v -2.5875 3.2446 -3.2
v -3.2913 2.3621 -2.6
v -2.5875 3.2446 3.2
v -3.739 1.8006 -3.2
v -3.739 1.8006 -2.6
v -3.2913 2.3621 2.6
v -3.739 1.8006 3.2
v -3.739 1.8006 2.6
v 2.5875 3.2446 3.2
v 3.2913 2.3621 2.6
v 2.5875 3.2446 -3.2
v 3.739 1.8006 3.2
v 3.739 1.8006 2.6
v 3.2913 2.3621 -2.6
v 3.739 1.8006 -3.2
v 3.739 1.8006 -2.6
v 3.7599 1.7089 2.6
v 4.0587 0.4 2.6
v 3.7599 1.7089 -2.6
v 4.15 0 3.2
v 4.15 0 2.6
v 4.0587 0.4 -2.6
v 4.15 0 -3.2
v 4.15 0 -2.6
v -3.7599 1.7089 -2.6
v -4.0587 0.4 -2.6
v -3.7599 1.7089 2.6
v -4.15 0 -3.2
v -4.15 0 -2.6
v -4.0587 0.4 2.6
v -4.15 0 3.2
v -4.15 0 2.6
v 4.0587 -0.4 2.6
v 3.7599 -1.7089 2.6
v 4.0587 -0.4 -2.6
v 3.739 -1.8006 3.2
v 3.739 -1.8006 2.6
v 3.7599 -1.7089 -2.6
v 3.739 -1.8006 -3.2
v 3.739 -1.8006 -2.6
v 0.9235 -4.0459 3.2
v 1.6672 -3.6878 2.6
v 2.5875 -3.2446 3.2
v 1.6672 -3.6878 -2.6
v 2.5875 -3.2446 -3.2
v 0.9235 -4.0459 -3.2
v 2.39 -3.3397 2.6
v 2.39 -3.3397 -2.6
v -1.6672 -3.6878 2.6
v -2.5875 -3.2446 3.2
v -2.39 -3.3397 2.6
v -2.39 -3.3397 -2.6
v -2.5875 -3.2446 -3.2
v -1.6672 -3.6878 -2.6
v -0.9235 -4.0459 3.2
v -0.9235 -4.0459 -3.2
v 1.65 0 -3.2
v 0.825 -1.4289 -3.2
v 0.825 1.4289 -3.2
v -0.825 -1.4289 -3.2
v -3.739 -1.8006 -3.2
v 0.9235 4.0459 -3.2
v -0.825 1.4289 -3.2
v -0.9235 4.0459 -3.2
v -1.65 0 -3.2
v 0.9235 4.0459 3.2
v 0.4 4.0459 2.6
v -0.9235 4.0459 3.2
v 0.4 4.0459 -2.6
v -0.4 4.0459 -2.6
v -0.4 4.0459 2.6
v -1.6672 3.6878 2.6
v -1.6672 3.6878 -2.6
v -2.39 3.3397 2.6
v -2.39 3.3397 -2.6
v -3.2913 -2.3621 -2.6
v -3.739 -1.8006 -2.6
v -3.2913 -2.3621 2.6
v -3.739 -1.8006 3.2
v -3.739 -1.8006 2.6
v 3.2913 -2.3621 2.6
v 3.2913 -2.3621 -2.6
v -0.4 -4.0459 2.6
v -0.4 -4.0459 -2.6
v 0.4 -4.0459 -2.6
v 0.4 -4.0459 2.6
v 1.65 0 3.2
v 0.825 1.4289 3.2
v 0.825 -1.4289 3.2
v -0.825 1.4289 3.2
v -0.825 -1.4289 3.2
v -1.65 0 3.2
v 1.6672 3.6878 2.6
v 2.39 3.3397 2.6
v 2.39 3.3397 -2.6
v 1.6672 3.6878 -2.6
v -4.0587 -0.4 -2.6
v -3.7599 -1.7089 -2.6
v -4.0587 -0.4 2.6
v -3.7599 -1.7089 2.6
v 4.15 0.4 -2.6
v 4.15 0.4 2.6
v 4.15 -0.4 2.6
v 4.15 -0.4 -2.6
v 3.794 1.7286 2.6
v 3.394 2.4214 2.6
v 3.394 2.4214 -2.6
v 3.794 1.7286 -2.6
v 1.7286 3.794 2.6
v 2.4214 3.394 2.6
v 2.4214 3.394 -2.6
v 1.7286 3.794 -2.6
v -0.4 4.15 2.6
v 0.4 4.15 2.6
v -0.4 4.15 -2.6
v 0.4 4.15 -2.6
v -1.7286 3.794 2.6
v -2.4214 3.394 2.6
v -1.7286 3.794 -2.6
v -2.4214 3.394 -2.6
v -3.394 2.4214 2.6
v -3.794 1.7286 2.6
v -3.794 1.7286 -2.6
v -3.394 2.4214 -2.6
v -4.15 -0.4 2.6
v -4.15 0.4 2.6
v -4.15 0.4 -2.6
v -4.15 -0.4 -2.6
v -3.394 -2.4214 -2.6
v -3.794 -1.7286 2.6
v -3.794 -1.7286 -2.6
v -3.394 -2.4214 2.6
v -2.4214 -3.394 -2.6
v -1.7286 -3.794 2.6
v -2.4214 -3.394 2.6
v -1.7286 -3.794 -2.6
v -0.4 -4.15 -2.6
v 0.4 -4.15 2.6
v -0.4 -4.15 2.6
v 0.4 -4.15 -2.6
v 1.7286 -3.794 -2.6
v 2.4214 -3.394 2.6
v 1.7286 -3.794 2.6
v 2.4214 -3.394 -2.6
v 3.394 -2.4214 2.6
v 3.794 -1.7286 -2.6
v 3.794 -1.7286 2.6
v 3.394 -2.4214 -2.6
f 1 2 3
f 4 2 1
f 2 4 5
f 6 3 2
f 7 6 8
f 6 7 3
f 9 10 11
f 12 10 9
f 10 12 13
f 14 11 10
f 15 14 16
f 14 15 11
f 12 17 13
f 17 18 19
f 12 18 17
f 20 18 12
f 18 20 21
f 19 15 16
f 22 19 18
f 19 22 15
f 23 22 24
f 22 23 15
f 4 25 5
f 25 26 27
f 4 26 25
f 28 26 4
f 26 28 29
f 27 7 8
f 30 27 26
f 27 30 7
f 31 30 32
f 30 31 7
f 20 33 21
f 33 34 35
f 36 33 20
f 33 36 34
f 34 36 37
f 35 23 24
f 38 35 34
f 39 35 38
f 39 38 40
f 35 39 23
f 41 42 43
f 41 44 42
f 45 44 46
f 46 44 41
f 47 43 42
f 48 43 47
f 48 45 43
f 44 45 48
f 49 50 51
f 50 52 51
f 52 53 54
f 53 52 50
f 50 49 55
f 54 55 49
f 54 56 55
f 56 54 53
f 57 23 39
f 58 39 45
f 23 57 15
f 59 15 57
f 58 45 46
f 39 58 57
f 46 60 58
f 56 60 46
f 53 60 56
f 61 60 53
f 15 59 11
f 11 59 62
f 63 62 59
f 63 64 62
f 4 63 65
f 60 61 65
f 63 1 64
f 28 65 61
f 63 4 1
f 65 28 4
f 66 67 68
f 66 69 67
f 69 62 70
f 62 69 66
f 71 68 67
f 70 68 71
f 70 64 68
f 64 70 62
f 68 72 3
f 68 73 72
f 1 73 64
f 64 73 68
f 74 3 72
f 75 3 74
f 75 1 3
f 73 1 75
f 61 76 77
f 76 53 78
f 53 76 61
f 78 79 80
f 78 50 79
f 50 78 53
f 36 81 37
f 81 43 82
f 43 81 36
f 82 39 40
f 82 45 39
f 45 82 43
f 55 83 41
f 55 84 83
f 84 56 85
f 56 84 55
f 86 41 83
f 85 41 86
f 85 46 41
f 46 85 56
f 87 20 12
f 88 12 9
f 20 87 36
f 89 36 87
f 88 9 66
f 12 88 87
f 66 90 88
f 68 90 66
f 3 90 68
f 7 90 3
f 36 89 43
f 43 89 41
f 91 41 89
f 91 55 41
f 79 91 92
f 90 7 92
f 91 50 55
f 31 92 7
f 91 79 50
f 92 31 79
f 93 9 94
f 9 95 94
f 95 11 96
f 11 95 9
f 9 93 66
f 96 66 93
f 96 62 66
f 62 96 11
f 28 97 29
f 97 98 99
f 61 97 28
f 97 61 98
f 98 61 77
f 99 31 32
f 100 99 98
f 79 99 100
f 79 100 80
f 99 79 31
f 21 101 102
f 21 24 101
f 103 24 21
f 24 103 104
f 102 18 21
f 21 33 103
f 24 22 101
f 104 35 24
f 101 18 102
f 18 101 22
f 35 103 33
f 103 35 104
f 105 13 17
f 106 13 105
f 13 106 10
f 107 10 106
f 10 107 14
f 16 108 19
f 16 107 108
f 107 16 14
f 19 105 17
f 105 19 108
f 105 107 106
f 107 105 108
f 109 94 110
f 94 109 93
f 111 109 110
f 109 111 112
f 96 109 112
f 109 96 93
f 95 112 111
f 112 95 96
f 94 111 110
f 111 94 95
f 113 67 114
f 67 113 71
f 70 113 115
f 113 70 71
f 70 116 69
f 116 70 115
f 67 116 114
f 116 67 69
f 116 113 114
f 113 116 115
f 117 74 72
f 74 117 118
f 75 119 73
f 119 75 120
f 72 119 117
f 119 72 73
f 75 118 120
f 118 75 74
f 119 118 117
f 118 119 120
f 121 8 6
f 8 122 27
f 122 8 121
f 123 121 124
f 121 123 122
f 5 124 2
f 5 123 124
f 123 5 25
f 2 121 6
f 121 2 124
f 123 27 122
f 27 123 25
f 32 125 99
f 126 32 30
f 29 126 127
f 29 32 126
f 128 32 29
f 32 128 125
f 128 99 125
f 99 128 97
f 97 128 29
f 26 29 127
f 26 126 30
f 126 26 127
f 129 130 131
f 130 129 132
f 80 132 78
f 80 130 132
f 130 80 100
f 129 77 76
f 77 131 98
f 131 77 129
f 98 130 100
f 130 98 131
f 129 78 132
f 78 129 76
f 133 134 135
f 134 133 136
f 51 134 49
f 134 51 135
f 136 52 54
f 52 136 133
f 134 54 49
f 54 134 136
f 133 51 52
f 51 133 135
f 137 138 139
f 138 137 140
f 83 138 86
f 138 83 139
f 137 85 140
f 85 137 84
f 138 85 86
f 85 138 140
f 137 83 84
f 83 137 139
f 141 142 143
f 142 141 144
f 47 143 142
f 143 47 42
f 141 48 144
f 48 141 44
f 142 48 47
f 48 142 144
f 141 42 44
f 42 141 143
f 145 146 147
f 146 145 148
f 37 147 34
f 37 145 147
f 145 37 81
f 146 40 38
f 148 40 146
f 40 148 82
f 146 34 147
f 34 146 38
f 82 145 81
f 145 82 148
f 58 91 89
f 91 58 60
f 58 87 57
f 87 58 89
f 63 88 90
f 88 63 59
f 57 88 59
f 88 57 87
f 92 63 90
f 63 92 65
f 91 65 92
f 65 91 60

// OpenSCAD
// Parameters
outer_diameter = 8.2; //[4.1:16.4:0.1]
length = 6.3; //[3.15:12.6:0.1]
screw_diameter = 4; //[2:8:0.1]
inner_thread_nominal = 4; //[3:6:1]
inner_minor_diameter = 3.3; //[1.65:6.6:0.05]
inner_major_diameter = 4; //[2:8:0.05]
lead_in_chamfer_length = 0.6; //[0.3:1.2:0.05]
lead_in_chamfer_angle_deg = 45; //[20:70:1]
knurl_depth = 0.3; //[0.15:0.6:0.05]
knurl_pitch = 1; //[0.5:2:0.05]
knurl_count = 12; //[6:24:1]
tolerance_outer_diameter = 0.1; //[0:0.3:0.01]
tolerance_length = 0.1; //[0:0.3:0.01]
overlap = 0.8; //[0.2:2:0.1]
ridge_width = 0.8; //[0.4:1.6:0.05]

// Threaded Insert - complete geometry
module threaded_insert() {
  color([0.8, 0.6, 0.2]) { // Brass color
    difference() {
      union() {
        // Insert body with chamfer
        union() {
          // Main cylindrical body
          cylinder(
            h = length + tolerance_length,
            r = (outer_diameter + tolerance_outer_diameter) / 2,
            center = true
          );
          // Lead-in chamfer
          translate([0, 0, ((length + tolerance_length) / 2) - (lead_in_chamfer_length + overlap) / 2])
            cylinder(
              h = lead_in_chamfer_length + overlap,
              r1 = (outer_diameter + tolerance_outer_diameter) / 2,
              r2 = ((outer_diameter + tolerance_outer_diameter) / 2) - lead_in_chamfer_length,
              center = true
            );
        }
        // Knurl ridges
        for (i = [0:knurl_count-1]) {
          rotate([0, 0, i * 360 / knurl_count])
            translate([(outer_diameter + tolerance_outer_diameter) / 2 - (knurl_depth + overlap) / 2, 0, 0])
              cube(
                [knurl_depth + overlap, ridge_width, (length + tolerance_length) - 2 * lead_in_chamfer_length],
                center = true
              );
        }
      }
      // Internal thread or clearance bore
      cylinder(
        h = (length + tolerance_length) + 2 * overlap,
        r = inner_minor_diameter / 2,
        center = true
      );
    }
  }
}

// Assembly
module assembly() {
  threaded_insert();
}

assembly();
